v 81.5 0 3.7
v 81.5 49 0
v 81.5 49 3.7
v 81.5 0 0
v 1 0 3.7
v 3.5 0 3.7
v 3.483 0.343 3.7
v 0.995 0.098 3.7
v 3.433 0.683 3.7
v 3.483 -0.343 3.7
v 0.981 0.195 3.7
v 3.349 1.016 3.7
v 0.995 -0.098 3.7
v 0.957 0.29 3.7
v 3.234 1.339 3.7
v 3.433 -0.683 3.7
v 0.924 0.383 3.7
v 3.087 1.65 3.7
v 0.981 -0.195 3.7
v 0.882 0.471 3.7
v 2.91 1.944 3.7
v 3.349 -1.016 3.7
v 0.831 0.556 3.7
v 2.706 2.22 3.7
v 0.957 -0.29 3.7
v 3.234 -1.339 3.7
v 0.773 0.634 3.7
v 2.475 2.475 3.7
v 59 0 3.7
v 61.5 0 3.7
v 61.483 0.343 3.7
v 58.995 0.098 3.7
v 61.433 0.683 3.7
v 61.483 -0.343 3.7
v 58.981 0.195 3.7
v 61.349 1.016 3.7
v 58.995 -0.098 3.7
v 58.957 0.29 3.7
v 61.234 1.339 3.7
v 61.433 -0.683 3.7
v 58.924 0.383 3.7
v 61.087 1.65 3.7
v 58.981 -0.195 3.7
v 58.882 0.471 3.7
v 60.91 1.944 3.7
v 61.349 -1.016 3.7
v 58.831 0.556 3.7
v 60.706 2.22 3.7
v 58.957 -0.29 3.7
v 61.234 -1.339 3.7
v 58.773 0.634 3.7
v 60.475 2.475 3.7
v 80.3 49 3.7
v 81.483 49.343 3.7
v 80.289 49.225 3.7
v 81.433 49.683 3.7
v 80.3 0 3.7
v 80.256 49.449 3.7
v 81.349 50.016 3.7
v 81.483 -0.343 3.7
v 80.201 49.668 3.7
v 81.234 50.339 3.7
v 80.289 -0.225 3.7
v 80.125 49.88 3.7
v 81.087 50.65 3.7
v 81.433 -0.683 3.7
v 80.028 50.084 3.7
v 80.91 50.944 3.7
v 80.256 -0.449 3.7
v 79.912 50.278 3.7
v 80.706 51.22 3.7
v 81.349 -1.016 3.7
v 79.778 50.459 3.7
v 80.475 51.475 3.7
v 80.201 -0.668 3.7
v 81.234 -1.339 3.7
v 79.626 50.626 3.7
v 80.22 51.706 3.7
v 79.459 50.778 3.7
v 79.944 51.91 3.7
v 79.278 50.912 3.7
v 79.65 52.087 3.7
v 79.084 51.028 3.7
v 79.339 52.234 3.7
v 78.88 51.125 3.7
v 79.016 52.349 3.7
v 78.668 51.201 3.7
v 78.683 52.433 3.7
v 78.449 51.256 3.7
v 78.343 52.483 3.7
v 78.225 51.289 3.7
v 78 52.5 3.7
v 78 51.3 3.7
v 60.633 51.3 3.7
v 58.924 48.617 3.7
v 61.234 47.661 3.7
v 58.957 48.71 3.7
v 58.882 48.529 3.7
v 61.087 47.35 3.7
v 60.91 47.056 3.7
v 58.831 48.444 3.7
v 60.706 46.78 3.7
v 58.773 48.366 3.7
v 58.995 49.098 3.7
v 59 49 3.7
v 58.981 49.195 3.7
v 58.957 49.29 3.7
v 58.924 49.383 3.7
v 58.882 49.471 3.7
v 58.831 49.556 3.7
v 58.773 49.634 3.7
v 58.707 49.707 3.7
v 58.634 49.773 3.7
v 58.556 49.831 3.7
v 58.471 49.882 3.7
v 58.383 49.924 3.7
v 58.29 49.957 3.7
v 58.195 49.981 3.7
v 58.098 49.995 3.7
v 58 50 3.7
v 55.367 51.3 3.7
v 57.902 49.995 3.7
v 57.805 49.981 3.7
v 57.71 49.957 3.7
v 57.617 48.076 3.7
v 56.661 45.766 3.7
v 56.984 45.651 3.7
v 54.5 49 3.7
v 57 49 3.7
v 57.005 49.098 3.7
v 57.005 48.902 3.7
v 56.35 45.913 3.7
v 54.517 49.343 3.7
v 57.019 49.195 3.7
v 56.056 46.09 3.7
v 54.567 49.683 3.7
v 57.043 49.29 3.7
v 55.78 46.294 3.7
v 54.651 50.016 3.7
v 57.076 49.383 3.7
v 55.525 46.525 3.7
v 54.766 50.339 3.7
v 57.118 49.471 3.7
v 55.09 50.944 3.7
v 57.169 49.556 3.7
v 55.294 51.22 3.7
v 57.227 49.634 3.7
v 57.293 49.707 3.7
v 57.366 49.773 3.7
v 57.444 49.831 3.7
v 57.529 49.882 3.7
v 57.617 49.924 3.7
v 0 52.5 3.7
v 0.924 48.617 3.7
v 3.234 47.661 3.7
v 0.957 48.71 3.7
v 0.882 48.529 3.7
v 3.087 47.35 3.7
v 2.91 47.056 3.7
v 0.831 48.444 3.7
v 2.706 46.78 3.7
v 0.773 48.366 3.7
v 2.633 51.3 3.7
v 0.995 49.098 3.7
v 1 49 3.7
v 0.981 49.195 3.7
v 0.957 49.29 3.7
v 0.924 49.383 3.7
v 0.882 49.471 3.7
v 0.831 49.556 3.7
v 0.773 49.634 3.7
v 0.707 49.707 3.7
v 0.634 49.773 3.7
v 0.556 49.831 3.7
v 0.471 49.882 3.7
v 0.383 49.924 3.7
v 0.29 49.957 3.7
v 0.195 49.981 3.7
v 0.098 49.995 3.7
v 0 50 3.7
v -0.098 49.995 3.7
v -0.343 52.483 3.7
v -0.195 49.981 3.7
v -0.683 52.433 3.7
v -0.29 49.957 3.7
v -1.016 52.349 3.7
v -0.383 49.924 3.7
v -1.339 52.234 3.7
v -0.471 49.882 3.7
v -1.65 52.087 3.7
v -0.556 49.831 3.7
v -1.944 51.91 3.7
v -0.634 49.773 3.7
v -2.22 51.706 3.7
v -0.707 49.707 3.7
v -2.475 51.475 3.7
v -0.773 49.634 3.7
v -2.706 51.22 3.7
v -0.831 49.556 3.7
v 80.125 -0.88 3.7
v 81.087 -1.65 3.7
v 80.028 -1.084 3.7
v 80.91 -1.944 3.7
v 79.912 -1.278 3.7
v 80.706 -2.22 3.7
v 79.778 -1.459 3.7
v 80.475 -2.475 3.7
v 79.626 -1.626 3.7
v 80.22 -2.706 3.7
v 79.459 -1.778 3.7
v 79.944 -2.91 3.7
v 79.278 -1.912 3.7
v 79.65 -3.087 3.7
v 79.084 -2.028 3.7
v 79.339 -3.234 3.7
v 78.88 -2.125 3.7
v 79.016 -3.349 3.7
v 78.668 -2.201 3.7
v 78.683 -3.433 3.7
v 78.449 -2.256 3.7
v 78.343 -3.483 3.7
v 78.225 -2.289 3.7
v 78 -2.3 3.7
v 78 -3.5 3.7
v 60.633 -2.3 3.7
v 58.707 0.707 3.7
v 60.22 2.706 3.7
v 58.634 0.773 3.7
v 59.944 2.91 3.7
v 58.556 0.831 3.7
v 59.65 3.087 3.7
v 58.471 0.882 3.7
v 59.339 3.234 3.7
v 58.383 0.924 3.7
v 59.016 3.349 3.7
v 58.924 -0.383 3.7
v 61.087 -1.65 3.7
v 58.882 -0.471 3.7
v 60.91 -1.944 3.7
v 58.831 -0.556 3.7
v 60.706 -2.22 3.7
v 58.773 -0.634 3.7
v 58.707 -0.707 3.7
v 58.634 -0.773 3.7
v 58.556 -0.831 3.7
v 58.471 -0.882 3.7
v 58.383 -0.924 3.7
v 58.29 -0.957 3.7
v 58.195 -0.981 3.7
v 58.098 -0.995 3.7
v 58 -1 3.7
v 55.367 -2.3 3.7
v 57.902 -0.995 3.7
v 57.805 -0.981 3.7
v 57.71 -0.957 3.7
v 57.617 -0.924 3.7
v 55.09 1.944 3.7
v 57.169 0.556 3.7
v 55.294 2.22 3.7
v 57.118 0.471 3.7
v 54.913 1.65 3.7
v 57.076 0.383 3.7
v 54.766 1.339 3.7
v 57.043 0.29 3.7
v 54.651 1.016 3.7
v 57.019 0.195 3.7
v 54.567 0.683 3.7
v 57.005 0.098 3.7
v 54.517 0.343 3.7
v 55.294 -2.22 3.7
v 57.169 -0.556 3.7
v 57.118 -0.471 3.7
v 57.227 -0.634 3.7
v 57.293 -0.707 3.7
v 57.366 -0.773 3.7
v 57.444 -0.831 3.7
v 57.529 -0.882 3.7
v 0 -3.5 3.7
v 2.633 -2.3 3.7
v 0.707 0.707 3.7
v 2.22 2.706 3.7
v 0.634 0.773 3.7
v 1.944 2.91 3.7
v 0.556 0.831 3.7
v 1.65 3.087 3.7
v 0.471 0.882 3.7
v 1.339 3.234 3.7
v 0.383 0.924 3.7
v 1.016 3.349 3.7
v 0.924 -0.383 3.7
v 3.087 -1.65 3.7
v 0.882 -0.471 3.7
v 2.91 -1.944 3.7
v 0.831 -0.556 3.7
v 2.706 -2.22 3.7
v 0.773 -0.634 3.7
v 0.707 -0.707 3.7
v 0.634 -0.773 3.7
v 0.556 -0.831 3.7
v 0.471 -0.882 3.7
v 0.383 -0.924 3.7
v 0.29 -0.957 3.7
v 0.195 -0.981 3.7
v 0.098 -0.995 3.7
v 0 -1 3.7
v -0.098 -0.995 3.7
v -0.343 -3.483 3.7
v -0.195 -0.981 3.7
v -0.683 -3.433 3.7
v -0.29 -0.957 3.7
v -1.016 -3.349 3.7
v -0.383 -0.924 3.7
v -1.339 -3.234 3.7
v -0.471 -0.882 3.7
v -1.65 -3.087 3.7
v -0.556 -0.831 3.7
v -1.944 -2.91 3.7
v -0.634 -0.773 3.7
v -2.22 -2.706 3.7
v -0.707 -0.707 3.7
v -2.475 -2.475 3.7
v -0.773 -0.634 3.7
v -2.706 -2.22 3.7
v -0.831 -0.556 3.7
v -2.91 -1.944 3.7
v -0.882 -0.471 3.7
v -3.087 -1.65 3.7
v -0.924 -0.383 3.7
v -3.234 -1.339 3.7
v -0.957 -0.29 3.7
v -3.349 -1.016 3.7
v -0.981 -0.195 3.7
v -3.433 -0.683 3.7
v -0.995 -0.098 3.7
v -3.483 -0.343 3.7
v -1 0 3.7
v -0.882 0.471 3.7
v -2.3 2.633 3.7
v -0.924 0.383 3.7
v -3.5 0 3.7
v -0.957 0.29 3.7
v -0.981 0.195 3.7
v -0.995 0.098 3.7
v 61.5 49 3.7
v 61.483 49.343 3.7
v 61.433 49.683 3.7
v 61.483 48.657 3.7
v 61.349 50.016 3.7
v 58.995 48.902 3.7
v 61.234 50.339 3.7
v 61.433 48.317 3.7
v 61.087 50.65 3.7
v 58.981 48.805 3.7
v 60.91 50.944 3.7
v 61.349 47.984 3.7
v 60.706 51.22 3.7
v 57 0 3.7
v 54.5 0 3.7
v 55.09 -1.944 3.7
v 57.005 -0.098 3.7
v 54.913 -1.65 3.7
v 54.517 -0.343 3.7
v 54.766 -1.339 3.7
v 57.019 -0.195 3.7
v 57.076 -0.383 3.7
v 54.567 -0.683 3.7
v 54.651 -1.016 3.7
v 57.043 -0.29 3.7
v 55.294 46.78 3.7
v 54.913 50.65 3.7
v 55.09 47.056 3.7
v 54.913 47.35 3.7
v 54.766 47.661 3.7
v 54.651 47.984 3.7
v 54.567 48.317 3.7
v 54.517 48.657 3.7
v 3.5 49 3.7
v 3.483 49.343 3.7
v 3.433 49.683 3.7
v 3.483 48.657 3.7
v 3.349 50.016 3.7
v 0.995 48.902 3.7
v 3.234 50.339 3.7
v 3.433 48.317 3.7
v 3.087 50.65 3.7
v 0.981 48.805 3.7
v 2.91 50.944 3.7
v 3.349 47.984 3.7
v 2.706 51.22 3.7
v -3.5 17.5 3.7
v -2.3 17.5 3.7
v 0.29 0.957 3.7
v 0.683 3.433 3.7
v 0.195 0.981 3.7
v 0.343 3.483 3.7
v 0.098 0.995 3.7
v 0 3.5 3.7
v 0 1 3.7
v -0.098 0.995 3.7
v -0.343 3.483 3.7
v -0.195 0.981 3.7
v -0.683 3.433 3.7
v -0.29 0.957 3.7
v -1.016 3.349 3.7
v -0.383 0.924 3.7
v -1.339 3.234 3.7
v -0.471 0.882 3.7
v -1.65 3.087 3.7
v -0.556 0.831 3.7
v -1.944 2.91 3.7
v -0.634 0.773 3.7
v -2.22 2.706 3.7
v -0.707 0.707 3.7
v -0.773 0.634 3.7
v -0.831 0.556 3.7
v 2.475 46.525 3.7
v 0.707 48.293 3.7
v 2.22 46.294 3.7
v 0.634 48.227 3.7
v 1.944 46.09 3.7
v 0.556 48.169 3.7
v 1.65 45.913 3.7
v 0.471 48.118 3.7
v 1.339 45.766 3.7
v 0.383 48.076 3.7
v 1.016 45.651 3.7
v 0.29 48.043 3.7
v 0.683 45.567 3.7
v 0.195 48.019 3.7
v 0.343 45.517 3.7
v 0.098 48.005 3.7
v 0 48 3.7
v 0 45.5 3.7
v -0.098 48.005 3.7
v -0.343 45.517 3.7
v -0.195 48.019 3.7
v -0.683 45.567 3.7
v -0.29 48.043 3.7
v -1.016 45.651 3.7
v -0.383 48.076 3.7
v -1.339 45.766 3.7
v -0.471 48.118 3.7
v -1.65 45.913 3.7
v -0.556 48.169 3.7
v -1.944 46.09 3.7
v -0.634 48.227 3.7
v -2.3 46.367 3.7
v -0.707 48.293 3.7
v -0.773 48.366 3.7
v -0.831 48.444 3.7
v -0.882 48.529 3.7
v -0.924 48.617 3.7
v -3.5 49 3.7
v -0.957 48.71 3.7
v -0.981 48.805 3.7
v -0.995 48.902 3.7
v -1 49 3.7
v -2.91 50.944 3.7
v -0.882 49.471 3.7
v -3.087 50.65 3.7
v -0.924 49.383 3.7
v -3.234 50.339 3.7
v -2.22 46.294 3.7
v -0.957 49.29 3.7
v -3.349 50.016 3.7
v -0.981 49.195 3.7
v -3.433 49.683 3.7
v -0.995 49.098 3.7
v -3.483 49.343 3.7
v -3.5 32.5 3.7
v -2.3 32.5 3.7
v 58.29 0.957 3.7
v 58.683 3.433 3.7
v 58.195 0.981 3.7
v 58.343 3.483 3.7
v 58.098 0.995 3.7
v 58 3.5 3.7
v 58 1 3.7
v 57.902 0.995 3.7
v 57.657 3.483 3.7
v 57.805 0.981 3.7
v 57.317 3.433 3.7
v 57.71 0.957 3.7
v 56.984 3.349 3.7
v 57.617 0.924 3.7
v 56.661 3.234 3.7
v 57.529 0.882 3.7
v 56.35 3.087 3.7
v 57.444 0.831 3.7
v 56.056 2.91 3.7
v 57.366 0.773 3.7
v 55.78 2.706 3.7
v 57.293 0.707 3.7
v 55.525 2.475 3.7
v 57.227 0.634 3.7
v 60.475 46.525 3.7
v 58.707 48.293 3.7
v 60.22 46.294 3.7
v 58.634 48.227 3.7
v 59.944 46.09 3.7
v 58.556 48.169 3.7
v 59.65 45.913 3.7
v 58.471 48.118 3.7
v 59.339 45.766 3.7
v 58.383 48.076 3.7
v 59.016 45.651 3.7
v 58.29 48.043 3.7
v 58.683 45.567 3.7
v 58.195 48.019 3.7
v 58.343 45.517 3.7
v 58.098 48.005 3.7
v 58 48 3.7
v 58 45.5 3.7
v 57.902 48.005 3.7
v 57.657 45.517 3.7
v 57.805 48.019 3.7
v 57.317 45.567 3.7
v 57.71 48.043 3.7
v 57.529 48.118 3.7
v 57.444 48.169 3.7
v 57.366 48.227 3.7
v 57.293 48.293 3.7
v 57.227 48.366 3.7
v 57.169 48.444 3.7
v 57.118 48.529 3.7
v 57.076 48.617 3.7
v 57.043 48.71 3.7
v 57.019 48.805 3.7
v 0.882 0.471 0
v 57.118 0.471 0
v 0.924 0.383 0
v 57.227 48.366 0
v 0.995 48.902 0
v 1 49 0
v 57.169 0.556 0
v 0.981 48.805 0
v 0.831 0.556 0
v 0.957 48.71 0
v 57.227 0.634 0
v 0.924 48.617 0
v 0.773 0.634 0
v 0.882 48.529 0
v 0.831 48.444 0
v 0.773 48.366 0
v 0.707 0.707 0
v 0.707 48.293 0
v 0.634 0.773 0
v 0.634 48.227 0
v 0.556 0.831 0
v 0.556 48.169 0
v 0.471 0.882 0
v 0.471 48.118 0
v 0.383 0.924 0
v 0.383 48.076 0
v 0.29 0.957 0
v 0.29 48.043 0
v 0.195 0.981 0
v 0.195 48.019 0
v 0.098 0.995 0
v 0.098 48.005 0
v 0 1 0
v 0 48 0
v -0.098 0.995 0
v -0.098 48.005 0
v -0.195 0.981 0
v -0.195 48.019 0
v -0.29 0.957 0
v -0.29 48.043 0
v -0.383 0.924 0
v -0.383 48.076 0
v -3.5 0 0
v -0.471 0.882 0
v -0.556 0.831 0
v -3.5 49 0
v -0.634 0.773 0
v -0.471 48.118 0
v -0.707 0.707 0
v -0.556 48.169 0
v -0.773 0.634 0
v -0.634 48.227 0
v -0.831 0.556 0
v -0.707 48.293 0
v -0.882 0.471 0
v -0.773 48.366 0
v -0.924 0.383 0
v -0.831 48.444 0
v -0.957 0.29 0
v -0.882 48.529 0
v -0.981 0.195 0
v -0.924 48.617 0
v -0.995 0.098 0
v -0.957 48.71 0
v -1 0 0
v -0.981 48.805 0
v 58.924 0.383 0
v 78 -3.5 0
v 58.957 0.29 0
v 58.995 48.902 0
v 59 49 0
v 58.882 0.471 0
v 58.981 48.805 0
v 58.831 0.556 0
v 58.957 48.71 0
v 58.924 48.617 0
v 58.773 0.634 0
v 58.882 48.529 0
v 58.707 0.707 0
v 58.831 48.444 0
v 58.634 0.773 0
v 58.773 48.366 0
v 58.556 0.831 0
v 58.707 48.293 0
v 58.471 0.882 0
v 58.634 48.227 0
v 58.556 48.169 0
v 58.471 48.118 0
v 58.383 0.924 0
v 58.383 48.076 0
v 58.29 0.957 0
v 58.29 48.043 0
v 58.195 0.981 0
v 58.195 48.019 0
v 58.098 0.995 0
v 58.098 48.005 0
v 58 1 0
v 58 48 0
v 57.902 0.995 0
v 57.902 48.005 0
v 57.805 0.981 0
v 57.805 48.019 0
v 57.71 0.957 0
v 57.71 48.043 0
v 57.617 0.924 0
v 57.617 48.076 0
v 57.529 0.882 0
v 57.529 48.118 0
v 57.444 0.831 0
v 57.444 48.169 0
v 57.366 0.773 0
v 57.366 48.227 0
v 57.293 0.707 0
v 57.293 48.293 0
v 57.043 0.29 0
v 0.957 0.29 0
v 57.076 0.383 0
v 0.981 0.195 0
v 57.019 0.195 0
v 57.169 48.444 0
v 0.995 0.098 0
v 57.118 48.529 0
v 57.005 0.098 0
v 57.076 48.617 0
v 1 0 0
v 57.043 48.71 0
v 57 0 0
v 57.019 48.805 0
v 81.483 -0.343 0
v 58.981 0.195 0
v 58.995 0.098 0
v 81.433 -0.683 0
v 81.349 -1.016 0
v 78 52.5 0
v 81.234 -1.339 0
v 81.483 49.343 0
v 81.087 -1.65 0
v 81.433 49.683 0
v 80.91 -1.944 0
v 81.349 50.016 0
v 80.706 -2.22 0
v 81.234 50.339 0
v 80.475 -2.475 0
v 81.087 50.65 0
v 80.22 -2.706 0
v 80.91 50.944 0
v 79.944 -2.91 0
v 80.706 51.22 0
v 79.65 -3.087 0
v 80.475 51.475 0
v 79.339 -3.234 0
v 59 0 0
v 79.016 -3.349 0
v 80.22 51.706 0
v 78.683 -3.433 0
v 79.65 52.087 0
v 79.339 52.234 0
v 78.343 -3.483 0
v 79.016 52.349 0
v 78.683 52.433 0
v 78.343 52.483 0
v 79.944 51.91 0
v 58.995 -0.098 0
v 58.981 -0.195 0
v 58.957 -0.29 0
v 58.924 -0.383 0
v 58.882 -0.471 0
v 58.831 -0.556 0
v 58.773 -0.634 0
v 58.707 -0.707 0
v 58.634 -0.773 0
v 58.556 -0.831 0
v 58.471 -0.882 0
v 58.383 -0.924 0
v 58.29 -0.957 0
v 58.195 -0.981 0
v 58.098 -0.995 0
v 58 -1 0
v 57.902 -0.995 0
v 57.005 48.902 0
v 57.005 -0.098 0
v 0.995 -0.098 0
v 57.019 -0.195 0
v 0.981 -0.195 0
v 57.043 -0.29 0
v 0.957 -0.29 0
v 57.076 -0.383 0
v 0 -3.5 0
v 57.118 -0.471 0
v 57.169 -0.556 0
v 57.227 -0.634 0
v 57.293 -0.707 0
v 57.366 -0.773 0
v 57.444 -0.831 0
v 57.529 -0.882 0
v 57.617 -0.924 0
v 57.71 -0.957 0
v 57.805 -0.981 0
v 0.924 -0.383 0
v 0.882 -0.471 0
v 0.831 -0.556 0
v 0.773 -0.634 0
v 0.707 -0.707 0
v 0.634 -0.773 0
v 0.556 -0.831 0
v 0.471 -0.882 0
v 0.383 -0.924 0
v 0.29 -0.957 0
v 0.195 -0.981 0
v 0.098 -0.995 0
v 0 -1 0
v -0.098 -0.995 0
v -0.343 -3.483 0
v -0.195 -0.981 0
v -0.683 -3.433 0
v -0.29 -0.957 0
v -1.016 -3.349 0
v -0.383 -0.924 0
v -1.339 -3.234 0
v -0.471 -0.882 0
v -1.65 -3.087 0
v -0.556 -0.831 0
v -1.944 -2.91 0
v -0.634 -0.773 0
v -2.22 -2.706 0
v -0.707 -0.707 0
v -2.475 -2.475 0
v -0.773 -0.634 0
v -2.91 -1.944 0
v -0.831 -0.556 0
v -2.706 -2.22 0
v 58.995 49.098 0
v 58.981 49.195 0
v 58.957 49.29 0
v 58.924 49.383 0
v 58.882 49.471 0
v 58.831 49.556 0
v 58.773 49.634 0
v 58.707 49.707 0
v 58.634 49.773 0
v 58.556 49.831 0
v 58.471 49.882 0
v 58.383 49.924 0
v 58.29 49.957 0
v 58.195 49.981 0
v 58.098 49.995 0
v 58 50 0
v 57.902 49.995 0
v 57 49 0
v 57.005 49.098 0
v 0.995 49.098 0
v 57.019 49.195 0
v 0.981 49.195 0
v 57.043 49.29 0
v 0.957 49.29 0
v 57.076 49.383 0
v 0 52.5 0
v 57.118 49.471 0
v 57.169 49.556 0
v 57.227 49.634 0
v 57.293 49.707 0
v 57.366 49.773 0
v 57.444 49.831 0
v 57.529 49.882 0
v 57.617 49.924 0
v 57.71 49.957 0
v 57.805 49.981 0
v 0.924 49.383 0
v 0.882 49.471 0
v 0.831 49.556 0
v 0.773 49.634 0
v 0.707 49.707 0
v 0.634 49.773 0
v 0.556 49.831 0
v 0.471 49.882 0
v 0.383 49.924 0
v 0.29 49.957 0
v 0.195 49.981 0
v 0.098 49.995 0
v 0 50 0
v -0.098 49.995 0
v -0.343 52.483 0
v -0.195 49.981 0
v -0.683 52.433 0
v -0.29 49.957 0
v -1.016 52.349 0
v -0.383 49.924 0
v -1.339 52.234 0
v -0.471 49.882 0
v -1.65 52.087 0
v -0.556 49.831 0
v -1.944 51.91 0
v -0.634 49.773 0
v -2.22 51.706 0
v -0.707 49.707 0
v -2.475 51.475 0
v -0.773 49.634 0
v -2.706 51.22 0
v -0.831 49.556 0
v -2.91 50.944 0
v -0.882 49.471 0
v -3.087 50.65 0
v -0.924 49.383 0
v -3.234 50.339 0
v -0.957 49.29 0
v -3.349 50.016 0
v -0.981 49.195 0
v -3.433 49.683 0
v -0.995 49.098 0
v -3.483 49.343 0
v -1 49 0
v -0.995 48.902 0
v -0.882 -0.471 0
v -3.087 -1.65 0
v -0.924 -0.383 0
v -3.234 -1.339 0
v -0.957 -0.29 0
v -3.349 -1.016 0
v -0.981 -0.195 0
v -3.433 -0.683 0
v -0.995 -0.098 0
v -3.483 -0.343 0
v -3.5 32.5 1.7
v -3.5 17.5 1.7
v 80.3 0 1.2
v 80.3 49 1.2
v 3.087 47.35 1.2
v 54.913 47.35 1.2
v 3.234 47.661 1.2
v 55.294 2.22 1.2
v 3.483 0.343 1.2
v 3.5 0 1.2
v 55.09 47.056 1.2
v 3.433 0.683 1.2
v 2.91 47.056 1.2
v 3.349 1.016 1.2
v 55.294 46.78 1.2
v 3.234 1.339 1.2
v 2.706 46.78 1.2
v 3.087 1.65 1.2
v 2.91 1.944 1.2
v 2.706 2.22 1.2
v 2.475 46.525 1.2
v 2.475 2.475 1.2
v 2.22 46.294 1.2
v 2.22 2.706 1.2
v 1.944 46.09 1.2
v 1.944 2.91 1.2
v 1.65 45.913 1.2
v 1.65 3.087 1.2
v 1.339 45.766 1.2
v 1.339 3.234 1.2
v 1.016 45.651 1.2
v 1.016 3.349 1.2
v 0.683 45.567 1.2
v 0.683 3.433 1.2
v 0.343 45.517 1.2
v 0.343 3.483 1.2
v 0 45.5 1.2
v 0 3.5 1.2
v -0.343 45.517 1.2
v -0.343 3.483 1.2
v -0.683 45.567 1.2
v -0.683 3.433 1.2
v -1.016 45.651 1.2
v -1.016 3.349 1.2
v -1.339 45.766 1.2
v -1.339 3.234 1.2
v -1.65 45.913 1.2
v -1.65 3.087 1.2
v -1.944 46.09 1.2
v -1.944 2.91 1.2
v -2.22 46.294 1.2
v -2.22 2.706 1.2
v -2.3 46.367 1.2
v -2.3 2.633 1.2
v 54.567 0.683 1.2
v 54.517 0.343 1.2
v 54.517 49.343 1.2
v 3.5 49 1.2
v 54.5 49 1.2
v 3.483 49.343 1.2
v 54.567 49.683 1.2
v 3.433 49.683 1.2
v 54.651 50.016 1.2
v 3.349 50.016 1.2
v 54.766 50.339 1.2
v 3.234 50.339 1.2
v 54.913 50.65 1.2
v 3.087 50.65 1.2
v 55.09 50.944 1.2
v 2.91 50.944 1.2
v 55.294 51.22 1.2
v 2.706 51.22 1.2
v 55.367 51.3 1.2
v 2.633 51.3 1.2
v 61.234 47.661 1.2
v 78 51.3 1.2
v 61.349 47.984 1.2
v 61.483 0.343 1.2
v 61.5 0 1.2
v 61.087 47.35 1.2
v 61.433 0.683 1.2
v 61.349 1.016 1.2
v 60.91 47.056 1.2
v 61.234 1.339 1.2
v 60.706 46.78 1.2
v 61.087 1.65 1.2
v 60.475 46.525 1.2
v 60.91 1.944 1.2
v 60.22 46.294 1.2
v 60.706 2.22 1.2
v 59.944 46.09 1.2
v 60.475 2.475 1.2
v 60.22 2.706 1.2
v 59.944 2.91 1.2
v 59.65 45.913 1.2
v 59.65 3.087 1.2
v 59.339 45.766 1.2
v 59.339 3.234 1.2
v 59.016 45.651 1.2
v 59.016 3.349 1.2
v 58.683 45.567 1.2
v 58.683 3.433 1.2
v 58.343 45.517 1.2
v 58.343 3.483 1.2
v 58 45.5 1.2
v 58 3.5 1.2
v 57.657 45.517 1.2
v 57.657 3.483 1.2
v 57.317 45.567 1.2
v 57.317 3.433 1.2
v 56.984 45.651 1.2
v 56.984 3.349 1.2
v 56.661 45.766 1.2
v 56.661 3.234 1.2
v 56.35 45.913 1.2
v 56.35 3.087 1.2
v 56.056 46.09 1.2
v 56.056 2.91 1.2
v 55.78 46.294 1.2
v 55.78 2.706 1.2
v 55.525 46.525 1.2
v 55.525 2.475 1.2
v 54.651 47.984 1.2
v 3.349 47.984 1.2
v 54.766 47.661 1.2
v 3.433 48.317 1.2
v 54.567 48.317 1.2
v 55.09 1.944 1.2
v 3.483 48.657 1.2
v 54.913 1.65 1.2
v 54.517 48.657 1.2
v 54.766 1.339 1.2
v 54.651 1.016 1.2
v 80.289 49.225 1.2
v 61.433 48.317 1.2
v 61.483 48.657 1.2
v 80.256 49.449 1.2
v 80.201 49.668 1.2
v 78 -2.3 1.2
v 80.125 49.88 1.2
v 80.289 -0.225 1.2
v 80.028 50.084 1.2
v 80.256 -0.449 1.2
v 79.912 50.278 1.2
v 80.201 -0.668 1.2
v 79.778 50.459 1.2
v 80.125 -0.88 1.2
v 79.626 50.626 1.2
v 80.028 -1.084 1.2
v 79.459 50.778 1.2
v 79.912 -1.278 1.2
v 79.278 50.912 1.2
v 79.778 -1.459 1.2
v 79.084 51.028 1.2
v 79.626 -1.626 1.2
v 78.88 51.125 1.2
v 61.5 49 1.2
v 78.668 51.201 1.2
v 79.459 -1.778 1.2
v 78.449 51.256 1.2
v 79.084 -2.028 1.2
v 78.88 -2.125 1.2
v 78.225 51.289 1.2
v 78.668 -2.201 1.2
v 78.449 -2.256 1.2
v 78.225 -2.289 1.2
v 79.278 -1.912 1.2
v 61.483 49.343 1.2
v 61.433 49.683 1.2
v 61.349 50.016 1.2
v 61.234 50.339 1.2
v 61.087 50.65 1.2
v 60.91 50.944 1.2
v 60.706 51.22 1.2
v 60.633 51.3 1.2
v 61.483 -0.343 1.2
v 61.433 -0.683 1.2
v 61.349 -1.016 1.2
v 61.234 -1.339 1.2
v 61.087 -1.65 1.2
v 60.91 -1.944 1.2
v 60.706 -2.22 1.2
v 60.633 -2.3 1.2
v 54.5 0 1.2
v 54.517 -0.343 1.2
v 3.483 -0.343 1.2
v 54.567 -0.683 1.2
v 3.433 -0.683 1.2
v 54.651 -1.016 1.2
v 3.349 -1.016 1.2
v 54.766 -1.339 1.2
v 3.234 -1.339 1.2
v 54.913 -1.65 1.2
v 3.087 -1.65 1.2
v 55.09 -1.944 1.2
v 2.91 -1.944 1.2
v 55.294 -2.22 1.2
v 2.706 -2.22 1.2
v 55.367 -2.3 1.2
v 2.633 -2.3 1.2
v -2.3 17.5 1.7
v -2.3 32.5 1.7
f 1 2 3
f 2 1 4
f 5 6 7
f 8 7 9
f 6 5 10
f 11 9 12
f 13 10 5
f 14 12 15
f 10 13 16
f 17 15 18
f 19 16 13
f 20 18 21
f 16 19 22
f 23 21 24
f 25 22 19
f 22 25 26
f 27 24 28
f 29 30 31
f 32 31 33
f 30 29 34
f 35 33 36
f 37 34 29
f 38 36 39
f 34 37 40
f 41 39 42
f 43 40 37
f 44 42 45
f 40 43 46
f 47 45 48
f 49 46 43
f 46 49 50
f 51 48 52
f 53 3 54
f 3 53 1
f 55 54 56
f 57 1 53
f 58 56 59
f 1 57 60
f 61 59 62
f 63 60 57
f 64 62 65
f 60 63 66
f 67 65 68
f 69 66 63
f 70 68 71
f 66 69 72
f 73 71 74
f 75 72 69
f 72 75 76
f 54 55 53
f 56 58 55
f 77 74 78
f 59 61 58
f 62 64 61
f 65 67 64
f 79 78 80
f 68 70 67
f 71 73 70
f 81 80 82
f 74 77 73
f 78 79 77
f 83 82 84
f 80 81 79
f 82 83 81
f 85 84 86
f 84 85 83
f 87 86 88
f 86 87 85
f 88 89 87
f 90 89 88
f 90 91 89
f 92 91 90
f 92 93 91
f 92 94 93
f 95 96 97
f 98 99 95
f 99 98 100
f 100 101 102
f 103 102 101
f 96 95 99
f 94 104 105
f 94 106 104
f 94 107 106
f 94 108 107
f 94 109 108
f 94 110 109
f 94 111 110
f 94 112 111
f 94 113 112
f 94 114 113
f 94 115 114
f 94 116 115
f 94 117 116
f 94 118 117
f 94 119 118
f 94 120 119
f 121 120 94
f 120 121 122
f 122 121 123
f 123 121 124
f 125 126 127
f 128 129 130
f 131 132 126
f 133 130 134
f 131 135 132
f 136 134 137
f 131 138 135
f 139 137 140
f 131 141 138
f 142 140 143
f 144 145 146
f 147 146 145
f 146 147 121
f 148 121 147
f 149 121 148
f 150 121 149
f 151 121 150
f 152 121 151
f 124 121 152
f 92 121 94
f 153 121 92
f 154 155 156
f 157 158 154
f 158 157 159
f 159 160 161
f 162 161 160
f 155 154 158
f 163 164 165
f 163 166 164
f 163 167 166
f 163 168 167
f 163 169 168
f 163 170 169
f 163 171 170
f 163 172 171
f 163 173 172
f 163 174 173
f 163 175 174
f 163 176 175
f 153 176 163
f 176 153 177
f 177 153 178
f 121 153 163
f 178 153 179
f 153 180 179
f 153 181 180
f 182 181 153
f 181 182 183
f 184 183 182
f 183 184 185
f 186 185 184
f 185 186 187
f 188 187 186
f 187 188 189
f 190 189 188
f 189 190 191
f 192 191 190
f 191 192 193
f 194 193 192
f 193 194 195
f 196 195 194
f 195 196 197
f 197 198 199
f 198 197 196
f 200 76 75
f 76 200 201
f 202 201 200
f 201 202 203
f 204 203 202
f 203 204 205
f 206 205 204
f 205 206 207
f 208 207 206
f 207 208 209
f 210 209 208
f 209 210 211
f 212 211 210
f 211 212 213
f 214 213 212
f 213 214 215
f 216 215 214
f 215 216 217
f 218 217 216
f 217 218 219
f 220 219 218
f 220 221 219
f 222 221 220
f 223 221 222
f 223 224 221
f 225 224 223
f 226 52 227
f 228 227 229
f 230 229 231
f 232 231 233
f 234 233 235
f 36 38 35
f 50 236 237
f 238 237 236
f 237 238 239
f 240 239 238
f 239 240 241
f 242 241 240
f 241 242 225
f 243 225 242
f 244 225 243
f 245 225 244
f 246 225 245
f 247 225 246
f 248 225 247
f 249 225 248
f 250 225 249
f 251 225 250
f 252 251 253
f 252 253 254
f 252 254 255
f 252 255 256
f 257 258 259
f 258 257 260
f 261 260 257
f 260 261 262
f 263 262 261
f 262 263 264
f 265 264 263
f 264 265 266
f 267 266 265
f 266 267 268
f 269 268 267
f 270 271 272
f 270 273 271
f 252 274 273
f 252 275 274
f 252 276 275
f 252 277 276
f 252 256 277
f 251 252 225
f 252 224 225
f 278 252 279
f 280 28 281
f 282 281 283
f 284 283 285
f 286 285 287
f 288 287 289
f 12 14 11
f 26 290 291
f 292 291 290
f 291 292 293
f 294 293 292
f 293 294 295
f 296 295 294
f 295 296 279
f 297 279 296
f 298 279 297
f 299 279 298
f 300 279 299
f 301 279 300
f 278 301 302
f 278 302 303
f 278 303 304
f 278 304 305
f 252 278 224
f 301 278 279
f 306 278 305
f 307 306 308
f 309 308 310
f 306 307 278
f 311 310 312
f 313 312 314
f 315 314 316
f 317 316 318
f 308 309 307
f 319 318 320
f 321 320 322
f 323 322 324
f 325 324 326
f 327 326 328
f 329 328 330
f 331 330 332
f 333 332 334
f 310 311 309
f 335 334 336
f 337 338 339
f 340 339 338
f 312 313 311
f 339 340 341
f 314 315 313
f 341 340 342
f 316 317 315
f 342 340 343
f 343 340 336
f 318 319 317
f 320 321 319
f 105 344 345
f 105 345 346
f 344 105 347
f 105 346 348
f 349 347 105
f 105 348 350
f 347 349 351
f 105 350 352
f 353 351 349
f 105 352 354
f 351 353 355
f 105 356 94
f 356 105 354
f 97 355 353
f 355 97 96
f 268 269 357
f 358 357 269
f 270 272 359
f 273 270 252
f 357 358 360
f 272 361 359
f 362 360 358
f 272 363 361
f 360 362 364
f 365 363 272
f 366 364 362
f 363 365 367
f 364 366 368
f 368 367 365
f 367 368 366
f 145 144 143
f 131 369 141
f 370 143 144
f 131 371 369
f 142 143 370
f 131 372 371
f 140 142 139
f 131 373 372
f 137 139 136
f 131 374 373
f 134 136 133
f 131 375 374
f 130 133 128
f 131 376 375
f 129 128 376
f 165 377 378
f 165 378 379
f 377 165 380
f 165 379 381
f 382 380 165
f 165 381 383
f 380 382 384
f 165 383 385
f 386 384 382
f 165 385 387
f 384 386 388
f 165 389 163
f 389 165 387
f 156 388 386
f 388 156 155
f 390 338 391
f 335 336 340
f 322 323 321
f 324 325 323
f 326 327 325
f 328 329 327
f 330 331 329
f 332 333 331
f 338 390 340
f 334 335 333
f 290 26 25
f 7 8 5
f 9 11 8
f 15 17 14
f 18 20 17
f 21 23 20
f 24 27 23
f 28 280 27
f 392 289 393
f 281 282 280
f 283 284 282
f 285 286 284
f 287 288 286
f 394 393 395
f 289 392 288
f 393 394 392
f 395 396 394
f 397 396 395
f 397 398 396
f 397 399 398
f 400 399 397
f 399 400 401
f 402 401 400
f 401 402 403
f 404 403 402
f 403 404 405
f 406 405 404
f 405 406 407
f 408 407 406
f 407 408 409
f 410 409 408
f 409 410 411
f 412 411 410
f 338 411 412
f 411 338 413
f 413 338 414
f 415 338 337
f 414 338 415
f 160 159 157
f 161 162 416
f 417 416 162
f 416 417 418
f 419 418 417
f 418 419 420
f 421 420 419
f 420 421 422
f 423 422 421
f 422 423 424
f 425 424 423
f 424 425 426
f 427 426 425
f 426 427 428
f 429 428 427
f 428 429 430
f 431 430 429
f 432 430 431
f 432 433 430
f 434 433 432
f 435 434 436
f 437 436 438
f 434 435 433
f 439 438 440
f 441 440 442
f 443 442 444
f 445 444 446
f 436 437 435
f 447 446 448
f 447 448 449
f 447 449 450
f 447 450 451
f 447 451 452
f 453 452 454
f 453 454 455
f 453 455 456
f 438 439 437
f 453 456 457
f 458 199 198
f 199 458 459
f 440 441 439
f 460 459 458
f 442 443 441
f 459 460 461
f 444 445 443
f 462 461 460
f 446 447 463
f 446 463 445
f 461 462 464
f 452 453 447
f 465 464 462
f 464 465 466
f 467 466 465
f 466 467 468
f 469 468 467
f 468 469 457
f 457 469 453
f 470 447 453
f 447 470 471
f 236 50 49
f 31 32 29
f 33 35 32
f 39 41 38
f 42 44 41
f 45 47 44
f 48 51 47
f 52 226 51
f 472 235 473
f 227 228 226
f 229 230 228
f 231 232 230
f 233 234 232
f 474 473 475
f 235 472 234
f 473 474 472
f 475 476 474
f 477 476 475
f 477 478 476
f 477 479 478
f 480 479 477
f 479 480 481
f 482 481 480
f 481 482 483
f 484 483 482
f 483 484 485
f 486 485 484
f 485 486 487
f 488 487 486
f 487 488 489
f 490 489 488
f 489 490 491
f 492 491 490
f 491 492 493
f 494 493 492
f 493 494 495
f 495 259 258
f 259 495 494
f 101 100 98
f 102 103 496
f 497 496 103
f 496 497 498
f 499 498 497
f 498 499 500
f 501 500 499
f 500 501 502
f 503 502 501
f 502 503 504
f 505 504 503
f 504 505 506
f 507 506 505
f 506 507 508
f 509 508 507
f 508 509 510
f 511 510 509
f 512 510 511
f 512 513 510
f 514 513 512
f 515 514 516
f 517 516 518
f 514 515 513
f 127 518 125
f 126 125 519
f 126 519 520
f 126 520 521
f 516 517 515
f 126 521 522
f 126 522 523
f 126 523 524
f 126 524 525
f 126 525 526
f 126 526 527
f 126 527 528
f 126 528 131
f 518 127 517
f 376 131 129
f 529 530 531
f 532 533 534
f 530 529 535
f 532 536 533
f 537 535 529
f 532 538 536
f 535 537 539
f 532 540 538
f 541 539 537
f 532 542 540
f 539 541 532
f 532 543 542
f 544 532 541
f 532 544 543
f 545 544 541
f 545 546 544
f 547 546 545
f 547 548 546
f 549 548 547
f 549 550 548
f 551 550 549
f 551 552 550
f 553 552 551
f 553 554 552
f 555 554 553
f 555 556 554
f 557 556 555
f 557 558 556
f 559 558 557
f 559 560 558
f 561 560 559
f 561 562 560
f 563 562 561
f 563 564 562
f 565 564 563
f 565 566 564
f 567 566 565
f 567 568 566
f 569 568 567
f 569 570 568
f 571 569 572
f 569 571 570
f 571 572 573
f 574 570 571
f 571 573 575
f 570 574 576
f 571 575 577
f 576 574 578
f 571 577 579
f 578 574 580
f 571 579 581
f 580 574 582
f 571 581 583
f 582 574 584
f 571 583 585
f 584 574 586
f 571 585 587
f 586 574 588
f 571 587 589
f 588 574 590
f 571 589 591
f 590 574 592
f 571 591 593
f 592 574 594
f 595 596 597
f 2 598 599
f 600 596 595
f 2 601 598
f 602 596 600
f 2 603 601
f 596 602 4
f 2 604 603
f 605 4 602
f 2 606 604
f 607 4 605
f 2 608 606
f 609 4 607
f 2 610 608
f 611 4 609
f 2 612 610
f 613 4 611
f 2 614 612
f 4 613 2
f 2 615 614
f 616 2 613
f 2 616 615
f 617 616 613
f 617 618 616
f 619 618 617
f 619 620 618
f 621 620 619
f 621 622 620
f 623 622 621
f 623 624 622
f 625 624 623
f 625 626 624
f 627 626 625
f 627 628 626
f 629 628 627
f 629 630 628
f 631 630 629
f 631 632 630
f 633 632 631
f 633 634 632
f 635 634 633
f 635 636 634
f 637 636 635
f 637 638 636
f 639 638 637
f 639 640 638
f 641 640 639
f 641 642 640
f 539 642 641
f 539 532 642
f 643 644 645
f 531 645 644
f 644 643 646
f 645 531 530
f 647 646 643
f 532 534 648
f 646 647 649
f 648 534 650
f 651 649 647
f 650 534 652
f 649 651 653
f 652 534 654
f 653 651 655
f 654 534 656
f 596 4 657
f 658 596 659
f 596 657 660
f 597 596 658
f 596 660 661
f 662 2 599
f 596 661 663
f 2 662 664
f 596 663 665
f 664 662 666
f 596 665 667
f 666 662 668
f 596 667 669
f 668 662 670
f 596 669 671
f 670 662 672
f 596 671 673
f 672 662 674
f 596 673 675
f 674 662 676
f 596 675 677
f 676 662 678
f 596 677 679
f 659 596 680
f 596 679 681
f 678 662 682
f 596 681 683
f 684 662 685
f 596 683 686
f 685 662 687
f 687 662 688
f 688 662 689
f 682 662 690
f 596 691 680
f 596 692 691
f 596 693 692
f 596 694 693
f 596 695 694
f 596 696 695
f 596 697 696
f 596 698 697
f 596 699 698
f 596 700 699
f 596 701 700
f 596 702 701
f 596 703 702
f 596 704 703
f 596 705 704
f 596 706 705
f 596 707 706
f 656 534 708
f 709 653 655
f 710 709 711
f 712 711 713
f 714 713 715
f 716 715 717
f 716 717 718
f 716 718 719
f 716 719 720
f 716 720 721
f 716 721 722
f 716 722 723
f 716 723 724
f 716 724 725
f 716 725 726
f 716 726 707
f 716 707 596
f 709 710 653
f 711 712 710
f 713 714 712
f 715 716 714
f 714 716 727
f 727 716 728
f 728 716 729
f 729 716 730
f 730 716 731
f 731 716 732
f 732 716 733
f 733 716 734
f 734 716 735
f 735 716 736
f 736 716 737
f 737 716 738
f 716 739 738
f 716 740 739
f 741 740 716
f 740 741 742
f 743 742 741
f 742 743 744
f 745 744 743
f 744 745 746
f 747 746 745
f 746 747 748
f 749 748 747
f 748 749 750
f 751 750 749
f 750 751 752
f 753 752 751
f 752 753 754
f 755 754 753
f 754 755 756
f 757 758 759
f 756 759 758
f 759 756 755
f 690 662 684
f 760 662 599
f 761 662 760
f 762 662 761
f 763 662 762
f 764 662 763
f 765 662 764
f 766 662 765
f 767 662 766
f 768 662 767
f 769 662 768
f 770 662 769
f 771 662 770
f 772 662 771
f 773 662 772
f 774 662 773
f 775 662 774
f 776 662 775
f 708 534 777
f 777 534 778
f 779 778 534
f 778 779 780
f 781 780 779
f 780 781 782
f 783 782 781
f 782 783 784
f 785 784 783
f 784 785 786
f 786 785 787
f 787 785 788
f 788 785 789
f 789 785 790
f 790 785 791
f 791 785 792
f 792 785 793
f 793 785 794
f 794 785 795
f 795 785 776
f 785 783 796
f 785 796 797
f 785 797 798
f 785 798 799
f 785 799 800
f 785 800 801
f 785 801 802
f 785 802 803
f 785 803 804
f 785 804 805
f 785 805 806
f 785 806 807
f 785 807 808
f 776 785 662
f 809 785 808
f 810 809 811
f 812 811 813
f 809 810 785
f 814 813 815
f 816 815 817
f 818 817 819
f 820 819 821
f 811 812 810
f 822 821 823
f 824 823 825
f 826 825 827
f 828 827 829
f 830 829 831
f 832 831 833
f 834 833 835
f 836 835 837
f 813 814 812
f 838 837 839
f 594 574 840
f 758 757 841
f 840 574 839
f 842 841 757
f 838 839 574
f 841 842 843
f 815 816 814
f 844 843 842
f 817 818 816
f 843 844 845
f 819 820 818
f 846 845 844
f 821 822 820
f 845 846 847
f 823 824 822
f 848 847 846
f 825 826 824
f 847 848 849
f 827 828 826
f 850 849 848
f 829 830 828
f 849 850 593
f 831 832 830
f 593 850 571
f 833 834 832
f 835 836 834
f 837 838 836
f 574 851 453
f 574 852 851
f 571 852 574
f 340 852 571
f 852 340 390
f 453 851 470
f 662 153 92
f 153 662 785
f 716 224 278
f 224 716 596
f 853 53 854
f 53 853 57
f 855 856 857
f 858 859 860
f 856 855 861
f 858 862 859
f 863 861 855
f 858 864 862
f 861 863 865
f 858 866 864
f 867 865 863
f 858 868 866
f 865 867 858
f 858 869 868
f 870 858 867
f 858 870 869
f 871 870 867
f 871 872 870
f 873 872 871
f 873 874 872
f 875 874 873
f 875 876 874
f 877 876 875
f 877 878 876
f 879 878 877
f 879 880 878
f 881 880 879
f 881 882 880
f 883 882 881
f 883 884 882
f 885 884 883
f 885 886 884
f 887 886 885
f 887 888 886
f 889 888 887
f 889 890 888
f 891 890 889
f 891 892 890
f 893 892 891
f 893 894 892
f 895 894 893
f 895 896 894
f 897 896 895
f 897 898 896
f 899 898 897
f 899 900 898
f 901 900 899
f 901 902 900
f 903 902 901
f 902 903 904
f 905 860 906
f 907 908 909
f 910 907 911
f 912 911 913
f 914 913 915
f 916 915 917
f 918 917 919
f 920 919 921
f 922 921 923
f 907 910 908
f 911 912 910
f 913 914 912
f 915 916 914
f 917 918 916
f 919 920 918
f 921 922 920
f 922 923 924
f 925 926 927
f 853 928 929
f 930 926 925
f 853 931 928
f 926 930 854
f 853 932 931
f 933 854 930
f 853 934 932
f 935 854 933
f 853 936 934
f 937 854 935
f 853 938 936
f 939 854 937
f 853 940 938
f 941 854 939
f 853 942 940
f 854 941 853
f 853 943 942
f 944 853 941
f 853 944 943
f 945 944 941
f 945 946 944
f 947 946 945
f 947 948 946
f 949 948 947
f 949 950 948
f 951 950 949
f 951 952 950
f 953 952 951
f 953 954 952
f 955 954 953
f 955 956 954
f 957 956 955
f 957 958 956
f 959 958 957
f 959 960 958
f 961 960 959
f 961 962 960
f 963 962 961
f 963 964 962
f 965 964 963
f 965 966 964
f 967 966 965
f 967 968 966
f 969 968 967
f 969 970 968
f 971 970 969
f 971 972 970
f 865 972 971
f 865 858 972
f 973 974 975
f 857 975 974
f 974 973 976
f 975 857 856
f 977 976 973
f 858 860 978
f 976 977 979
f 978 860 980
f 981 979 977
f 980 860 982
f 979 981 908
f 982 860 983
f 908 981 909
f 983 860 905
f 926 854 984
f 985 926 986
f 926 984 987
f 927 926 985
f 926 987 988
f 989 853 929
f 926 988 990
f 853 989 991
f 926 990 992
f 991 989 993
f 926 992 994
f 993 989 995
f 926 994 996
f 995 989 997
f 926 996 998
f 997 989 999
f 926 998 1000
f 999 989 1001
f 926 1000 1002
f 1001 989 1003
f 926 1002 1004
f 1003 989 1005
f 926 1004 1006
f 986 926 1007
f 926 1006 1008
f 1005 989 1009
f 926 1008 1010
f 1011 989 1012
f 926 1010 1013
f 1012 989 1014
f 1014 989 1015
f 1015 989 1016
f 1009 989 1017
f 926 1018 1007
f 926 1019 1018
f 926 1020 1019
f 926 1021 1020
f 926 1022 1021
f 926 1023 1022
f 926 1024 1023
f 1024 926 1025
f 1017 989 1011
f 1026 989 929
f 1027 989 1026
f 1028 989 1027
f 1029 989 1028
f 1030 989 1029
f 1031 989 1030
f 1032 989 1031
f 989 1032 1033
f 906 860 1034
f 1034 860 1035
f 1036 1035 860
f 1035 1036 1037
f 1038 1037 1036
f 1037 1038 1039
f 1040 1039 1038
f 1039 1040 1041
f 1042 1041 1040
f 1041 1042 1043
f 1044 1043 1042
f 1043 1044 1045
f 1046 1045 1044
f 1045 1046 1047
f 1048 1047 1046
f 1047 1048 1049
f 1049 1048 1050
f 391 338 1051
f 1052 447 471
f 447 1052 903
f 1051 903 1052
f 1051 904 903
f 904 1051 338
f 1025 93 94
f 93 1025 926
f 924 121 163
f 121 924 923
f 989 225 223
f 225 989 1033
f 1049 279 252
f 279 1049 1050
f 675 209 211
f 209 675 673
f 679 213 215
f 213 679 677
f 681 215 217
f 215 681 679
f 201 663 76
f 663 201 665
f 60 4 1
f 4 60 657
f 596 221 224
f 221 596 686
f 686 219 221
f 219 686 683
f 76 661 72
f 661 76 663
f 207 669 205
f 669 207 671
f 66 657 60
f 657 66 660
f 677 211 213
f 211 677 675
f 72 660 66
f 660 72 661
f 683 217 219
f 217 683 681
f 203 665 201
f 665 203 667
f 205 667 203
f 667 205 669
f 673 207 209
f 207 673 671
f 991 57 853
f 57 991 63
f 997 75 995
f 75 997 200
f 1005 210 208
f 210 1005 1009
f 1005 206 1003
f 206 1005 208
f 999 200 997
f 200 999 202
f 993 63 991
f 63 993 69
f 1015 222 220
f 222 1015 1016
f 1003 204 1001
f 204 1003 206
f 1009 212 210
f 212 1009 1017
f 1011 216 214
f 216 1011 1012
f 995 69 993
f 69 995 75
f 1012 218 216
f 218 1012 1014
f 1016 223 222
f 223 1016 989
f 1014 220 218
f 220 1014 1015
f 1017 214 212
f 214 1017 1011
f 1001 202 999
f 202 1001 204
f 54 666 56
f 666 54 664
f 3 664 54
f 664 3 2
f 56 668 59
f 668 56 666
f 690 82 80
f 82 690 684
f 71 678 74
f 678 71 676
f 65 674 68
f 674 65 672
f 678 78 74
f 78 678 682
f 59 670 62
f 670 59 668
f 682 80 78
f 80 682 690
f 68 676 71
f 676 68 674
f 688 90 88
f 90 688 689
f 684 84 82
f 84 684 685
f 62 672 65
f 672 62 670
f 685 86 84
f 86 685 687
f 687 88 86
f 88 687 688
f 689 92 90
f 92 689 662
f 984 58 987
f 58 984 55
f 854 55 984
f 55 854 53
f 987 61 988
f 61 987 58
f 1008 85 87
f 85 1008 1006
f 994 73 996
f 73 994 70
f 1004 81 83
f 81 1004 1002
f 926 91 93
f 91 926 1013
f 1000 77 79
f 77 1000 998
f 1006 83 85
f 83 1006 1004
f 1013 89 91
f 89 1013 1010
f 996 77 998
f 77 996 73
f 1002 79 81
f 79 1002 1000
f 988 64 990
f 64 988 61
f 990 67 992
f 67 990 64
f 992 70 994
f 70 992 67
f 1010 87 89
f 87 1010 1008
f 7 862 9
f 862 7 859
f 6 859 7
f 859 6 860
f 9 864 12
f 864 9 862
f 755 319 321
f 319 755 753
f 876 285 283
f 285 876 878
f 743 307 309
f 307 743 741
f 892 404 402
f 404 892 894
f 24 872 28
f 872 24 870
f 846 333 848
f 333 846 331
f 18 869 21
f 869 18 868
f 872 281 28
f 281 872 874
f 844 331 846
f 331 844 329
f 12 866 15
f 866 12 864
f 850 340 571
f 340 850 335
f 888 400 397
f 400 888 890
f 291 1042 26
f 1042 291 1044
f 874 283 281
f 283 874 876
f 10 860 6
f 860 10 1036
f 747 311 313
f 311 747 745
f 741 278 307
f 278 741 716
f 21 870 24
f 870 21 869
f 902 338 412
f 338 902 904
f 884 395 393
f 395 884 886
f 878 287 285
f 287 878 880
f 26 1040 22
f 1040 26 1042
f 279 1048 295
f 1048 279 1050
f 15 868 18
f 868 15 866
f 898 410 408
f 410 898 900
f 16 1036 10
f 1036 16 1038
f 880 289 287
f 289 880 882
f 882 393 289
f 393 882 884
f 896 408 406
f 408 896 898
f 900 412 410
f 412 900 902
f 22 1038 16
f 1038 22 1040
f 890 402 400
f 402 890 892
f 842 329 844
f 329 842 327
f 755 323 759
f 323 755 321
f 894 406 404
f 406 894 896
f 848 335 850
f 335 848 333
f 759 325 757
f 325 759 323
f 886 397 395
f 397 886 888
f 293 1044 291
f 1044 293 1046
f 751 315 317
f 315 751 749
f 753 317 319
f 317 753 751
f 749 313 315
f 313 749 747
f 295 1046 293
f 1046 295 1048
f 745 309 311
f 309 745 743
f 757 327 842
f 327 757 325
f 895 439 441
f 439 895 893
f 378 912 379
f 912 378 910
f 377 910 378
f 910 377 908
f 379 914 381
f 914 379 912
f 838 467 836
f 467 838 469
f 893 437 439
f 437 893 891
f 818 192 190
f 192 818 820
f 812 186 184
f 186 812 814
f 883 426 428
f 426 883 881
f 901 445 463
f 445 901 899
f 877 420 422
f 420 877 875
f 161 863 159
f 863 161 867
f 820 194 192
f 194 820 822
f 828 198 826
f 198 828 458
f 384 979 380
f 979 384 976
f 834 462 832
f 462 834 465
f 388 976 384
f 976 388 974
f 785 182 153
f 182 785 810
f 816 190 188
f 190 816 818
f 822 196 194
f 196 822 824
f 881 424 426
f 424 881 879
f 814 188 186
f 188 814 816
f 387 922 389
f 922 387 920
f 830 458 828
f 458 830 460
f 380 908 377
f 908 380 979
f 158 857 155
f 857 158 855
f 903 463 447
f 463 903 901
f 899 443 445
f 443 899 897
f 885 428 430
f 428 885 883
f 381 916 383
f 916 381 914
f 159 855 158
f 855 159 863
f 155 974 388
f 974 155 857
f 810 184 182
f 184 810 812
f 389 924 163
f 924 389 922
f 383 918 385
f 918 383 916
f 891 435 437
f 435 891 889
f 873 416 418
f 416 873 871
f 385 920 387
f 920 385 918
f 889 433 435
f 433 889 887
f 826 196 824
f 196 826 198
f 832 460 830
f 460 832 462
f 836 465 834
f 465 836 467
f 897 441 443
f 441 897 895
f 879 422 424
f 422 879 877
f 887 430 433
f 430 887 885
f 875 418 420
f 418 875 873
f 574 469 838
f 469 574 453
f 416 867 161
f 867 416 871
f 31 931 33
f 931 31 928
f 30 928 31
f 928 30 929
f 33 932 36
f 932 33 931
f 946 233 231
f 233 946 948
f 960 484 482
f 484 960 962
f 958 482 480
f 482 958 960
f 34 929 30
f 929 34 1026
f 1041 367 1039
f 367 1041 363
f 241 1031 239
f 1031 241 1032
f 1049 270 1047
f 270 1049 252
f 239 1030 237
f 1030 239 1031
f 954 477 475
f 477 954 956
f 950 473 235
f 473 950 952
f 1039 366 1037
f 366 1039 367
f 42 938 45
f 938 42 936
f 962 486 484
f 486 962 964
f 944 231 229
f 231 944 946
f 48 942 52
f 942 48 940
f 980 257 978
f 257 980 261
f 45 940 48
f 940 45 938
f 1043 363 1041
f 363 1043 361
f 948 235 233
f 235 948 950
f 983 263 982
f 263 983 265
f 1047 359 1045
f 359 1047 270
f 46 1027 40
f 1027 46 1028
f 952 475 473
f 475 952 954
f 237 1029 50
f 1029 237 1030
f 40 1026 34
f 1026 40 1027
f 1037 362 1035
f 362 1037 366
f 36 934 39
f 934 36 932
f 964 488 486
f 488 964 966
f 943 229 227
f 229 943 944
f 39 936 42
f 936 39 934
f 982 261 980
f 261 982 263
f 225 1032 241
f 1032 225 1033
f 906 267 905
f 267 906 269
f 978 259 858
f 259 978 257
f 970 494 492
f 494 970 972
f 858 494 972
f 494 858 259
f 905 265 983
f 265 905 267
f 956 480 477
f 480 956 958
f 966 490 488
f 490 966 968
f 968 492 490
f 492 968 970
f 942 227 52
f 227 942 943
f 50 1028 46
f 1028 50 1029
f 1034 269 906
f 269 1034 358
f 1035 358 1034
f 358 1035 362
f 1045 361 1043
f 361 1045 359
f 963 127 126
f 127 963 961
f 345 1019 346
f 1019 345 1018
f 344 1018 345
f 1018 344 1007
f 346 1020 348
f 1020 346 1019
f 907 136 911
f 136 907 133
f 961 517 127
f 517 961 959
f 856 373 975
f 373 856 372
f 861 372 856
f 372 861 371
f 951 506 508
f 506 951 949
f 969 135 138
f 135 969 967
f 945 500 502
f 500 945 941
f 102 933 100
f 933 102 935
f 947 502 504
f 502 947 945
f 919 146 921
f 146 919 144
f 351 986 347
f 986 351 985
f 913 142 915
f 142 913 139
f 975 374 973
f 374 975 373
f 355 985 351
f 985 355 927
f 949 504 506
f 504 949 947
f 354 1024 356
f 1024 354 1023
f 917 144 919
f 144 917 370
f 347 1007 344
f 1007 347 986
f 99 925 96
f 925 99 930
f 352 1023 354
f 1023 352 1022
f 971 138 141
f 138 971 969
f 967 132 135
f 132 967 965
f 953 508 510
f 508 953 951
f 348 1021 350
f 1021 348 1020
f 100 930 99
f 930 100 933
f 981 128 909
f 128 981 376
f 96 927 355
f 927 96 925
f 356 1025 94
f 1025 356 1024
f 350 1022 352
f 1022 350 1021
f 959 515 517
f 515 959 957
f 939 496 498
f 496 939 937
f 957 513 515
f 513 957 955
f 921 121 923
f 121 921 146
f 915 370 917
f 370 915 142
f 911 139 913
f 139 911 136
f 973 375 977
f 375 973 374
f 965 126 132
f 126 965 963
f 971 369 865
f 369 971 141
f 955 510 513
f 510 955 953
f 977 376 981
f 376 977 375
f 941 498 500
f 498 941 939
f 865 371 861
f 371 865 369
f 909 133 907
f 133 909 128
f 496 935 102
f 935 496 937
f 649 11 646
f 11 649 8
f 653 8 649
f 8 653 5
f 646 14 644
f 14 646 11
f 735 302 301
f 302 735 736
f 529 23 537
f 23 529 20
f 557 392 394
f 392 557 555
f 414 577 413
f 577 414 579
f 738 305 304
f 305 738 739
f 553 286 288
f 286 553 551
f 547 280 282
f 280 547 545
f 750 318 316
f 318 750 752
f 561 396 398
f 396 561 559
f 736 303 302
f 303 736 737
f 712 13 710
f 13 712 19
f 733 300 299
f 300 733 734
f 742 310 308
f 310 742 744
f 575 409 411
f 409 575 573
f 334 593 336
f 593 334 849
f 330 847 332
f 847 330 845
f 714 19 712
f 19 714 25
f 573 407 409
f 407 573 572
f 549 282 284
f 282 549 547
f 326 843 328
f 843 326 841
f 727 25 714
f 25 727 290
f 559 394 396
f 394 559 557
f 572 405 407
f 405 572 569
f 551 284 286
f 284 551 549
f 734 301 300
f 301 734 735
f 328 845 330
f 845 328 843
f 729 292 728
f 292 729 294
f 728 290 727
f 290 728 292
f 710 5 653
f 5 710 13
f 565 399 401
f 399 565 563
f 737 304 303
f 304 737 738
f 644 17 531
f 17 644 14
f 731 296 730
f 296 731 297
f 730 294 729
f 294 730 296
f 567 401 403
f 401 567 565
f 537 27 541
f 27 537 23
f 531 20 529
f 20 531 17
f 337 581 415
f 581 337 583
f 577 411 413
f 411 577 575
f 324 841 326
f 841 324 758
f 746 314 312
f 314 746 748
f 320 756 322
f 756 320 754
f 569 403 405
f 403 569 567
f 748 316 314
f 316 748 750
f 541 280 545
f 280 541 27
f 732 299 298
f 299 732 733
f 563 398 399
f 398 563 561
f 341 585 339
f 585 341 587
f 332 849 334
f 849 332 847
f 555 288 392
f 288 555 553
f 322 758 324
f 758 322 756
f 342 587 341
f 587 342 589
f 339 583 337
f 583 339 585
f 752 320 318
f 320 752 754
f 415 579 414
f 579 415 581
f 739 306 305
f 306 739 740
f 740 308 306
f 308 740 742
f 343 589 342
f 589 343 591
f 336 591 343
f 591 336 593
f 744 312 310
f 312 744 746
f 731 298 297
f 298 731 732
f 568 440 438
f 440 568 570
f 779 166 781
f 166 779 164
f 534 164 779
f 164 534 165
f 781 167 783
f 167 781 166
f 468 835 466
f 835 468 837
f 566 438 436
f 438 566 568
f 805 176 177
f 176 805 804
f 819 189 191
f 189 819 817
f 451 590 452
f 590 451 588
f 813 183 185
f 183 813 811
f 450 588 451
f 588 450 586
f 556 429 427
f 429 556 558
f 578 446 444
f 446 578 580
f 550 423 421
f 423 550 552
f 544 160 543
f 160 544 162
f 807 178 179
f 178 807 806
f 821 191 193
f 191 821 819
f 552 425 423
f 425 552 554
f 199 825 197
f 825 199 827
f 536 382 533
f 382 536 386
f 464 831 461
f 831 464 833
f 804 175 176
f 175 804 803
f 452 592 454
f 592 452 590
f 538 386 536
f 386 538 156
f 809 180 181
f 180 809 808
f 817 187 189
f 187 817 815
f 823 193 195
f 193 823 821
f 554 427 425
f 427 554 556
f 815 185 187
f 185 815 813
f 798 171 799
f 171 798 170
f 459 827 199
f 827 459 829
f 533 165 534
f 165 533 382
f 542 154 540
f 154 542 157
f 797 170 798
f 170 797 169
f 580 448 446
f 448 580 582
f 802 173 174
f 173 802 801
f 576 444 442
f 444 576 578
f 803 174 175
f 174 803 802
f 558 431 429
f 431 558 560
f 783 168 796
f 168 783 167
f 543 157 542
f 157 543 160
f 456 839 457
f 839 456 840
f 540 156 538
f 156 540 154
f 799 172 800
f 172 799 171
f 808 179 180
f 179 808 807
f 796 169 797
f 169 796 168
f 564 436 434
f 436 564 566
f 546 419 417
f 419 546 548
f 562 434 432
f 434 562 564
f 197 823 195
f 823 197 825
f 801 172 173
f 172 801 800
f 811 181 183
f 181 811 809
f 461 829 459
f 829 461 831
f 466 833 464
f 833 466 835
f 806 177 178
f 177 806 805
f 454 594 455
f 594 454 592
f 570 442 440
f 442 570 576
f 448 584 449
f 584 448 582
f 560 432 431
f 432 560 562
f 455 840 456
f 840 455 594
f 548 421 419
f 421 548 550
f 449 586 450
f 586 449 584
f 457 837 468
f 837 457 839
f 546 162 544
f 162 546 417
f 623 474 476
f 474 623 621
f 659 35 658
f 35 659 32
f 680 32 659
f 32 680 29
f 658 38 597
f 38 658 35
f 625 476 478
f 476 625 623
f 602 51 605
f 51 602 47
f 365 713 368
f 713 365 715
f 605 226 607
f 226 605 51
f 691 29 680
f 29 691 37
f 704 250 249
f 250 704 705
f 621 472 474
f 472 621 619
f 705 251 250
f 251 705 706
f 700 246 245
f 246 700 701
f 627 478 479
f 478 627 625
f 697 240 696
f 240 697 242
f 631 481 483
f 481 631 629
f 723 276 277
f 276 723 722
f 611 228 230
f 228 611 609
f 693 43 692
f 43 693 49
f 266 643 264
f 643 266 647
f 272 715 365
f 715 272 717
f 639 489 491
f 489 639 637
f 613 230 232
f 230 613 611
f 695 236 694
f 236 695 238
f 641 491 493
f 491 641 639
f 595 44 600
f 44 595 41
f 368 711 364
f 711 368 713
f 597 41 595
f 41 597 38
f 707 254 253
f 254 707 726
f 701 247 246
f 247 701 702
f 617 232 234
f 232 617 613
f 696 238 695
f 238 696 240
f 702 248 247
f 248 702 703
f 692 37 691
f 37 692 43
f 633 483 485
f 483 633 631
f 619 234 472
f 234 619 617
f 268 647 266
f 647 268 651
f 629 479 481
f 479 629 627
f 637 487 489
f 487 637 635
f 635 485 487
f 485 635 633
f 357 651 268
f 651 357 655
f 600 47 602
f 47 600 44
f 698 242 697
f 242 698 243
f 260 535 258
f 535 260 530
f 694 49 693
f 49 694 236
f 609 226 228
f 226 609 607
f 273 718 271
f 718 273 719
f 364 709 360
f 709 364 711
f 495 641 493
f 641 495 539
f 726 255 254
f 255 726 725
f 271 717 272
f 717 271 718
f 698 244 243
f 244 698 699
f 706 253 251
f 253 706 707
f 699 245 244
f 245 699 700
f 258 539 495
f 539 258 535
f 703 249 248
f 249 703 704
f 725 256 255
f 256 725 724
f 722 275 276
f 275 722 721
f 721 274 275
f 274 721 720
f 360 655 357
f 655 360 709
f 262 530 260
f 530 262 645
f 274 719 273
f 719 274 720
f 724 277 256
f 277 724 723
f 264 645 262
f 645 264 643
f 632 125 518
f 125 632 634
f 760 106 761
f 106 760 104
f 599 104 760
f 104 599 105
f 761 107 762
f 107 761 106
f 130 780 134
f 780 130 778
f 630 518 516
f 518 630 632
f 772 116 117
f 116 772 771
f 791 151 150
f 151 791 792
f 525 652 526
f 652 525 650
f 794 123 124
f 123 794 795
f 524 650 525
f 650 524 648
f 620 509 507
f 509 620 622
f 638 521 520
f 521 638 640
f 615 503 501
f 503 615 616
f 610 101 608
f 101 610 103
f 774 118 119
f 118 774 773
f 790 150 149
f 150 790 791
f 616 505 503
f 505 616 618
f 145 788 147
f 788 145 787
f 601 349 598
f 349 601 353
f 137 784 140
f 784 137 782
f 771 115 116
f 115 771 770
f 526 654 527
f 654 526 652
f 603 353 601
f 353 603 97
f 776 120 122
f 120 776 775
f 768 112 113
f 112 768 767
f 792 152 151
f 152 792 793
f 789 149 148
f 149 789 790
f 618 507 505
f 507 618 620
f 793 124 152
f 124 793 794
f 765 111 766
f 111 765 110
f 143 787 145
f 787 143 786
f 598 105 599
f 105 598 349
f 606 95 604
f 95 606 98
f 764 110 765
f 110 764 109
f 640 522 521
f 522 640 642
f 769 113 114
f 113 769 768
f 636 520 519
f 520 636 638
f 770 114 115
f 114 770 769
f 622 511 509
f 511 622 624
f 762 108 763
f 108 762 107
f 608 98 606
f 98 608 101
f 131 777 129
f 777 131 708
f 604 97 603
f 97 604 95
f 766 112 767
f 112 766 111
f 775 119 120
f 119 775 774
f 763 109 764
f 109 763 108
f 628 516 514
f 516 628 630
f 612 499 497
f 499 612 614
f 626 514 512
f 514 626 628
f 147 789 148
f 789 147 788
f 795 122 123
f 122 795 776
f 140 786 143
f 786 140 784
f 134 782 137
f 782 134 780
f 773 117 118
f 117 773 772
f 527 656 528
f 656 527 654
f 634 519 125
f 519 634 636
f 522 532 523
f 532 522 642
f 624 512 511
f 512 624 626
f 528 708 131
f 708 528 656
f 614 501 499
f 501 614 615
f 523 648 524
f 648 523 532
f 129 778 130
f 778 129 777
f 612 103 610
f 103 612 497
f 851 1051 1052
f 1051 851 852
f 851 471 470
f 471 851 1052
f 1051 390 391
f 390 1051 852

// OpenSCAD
countersink = false; //countersink screwmount?
vesa=false; //vesa mount? configure in vesa.scad and export as stl
modelB=true; //raspi model B?
zipties=false; //add holes for zipties
thickness=1.2; //wall thickness
drill=1; //screwmount drill

//these shouldn't need changing
radius=3.5; //screwmount radius
height=49;
width= modelB ? 78 : 58;
depth=thickness+2.5;
$fn = 64; //number of faces on a circle

difference() //finishing touches
{
    union() //add brackets etc
    {
        difference() //make hollow
        {
            union() //main shape
            {
                
                //walls and floor
                translate([-radius,0,0])
                    cube([width+2*radius,height,depth]);
                translate([0,-radius,0])
                    cube([width,height+2*radius,depth]);
                
                //add vesa mount if needed
                if(vesa)
                    translate([width/2,height/2,0])
                        import("../stl/vesa.stl");
            }
                
            //carve hollow
            translate([-radius+thickness,-radius+thickness,thickness])
                cube([width+2*(radius-thickness),height+2*(radius-thickness),depth]);
        }
                                
        //support into corners without mounts
        if(modelB)
            translate([width,0,0])
                difference()
                {
                    
                    //rounded corners
                    for(y = [0,height])
                        translate([0,y,0])
                            difference()
                            {
                                //for(n = [0,thickness]) does not work
                                cylinder(depth,radius,radius);
                                translate([0,0,thickness])
                                    cylinder(depth-thickness,radius-thickness,radius-thickness);
                            }
                        
                        //cleanup inside
                        translate([-radius,-radius+thickness,thickness])
                            cube([radius,height+radius+thickness,depth-thickness]);
                        translate([0,0,thickness])
                            cube([radius-thickness,height,depth-thickness]);
                }
        
        //add the mounting brackets
        for(x = [0,58])
            for(y = [0,height])
                translate([x,y,0])
                    cylinder(depth,radius,radius);
    }

    //drill and countersink mounting brackets
    for(x = [0,58])
            for(y = [0,height])
                translate([x,y,0])
                {
                    cylinder(depth,drill,drill);
                    if(countersink)
                        cylinder(drill,drill*2,drill);
                }
    
    //add slot for microsd
    translate([-radius,21-radius,depth-2])
        cube([16,15,2]);
                
    //holes for zipties
    if(zipties)
    translate([width/2,height/2,0])
    {
        
        //center hole
        translate([-15,-15,0])
            cube([30,30,thickness]);
        
        //edge holes
        for(n = [0 : 3])
            rotate([0,0,90*n])
                translate([height/2,-15,0])
                    cube([6,30,thickness*2]);
    }
}
